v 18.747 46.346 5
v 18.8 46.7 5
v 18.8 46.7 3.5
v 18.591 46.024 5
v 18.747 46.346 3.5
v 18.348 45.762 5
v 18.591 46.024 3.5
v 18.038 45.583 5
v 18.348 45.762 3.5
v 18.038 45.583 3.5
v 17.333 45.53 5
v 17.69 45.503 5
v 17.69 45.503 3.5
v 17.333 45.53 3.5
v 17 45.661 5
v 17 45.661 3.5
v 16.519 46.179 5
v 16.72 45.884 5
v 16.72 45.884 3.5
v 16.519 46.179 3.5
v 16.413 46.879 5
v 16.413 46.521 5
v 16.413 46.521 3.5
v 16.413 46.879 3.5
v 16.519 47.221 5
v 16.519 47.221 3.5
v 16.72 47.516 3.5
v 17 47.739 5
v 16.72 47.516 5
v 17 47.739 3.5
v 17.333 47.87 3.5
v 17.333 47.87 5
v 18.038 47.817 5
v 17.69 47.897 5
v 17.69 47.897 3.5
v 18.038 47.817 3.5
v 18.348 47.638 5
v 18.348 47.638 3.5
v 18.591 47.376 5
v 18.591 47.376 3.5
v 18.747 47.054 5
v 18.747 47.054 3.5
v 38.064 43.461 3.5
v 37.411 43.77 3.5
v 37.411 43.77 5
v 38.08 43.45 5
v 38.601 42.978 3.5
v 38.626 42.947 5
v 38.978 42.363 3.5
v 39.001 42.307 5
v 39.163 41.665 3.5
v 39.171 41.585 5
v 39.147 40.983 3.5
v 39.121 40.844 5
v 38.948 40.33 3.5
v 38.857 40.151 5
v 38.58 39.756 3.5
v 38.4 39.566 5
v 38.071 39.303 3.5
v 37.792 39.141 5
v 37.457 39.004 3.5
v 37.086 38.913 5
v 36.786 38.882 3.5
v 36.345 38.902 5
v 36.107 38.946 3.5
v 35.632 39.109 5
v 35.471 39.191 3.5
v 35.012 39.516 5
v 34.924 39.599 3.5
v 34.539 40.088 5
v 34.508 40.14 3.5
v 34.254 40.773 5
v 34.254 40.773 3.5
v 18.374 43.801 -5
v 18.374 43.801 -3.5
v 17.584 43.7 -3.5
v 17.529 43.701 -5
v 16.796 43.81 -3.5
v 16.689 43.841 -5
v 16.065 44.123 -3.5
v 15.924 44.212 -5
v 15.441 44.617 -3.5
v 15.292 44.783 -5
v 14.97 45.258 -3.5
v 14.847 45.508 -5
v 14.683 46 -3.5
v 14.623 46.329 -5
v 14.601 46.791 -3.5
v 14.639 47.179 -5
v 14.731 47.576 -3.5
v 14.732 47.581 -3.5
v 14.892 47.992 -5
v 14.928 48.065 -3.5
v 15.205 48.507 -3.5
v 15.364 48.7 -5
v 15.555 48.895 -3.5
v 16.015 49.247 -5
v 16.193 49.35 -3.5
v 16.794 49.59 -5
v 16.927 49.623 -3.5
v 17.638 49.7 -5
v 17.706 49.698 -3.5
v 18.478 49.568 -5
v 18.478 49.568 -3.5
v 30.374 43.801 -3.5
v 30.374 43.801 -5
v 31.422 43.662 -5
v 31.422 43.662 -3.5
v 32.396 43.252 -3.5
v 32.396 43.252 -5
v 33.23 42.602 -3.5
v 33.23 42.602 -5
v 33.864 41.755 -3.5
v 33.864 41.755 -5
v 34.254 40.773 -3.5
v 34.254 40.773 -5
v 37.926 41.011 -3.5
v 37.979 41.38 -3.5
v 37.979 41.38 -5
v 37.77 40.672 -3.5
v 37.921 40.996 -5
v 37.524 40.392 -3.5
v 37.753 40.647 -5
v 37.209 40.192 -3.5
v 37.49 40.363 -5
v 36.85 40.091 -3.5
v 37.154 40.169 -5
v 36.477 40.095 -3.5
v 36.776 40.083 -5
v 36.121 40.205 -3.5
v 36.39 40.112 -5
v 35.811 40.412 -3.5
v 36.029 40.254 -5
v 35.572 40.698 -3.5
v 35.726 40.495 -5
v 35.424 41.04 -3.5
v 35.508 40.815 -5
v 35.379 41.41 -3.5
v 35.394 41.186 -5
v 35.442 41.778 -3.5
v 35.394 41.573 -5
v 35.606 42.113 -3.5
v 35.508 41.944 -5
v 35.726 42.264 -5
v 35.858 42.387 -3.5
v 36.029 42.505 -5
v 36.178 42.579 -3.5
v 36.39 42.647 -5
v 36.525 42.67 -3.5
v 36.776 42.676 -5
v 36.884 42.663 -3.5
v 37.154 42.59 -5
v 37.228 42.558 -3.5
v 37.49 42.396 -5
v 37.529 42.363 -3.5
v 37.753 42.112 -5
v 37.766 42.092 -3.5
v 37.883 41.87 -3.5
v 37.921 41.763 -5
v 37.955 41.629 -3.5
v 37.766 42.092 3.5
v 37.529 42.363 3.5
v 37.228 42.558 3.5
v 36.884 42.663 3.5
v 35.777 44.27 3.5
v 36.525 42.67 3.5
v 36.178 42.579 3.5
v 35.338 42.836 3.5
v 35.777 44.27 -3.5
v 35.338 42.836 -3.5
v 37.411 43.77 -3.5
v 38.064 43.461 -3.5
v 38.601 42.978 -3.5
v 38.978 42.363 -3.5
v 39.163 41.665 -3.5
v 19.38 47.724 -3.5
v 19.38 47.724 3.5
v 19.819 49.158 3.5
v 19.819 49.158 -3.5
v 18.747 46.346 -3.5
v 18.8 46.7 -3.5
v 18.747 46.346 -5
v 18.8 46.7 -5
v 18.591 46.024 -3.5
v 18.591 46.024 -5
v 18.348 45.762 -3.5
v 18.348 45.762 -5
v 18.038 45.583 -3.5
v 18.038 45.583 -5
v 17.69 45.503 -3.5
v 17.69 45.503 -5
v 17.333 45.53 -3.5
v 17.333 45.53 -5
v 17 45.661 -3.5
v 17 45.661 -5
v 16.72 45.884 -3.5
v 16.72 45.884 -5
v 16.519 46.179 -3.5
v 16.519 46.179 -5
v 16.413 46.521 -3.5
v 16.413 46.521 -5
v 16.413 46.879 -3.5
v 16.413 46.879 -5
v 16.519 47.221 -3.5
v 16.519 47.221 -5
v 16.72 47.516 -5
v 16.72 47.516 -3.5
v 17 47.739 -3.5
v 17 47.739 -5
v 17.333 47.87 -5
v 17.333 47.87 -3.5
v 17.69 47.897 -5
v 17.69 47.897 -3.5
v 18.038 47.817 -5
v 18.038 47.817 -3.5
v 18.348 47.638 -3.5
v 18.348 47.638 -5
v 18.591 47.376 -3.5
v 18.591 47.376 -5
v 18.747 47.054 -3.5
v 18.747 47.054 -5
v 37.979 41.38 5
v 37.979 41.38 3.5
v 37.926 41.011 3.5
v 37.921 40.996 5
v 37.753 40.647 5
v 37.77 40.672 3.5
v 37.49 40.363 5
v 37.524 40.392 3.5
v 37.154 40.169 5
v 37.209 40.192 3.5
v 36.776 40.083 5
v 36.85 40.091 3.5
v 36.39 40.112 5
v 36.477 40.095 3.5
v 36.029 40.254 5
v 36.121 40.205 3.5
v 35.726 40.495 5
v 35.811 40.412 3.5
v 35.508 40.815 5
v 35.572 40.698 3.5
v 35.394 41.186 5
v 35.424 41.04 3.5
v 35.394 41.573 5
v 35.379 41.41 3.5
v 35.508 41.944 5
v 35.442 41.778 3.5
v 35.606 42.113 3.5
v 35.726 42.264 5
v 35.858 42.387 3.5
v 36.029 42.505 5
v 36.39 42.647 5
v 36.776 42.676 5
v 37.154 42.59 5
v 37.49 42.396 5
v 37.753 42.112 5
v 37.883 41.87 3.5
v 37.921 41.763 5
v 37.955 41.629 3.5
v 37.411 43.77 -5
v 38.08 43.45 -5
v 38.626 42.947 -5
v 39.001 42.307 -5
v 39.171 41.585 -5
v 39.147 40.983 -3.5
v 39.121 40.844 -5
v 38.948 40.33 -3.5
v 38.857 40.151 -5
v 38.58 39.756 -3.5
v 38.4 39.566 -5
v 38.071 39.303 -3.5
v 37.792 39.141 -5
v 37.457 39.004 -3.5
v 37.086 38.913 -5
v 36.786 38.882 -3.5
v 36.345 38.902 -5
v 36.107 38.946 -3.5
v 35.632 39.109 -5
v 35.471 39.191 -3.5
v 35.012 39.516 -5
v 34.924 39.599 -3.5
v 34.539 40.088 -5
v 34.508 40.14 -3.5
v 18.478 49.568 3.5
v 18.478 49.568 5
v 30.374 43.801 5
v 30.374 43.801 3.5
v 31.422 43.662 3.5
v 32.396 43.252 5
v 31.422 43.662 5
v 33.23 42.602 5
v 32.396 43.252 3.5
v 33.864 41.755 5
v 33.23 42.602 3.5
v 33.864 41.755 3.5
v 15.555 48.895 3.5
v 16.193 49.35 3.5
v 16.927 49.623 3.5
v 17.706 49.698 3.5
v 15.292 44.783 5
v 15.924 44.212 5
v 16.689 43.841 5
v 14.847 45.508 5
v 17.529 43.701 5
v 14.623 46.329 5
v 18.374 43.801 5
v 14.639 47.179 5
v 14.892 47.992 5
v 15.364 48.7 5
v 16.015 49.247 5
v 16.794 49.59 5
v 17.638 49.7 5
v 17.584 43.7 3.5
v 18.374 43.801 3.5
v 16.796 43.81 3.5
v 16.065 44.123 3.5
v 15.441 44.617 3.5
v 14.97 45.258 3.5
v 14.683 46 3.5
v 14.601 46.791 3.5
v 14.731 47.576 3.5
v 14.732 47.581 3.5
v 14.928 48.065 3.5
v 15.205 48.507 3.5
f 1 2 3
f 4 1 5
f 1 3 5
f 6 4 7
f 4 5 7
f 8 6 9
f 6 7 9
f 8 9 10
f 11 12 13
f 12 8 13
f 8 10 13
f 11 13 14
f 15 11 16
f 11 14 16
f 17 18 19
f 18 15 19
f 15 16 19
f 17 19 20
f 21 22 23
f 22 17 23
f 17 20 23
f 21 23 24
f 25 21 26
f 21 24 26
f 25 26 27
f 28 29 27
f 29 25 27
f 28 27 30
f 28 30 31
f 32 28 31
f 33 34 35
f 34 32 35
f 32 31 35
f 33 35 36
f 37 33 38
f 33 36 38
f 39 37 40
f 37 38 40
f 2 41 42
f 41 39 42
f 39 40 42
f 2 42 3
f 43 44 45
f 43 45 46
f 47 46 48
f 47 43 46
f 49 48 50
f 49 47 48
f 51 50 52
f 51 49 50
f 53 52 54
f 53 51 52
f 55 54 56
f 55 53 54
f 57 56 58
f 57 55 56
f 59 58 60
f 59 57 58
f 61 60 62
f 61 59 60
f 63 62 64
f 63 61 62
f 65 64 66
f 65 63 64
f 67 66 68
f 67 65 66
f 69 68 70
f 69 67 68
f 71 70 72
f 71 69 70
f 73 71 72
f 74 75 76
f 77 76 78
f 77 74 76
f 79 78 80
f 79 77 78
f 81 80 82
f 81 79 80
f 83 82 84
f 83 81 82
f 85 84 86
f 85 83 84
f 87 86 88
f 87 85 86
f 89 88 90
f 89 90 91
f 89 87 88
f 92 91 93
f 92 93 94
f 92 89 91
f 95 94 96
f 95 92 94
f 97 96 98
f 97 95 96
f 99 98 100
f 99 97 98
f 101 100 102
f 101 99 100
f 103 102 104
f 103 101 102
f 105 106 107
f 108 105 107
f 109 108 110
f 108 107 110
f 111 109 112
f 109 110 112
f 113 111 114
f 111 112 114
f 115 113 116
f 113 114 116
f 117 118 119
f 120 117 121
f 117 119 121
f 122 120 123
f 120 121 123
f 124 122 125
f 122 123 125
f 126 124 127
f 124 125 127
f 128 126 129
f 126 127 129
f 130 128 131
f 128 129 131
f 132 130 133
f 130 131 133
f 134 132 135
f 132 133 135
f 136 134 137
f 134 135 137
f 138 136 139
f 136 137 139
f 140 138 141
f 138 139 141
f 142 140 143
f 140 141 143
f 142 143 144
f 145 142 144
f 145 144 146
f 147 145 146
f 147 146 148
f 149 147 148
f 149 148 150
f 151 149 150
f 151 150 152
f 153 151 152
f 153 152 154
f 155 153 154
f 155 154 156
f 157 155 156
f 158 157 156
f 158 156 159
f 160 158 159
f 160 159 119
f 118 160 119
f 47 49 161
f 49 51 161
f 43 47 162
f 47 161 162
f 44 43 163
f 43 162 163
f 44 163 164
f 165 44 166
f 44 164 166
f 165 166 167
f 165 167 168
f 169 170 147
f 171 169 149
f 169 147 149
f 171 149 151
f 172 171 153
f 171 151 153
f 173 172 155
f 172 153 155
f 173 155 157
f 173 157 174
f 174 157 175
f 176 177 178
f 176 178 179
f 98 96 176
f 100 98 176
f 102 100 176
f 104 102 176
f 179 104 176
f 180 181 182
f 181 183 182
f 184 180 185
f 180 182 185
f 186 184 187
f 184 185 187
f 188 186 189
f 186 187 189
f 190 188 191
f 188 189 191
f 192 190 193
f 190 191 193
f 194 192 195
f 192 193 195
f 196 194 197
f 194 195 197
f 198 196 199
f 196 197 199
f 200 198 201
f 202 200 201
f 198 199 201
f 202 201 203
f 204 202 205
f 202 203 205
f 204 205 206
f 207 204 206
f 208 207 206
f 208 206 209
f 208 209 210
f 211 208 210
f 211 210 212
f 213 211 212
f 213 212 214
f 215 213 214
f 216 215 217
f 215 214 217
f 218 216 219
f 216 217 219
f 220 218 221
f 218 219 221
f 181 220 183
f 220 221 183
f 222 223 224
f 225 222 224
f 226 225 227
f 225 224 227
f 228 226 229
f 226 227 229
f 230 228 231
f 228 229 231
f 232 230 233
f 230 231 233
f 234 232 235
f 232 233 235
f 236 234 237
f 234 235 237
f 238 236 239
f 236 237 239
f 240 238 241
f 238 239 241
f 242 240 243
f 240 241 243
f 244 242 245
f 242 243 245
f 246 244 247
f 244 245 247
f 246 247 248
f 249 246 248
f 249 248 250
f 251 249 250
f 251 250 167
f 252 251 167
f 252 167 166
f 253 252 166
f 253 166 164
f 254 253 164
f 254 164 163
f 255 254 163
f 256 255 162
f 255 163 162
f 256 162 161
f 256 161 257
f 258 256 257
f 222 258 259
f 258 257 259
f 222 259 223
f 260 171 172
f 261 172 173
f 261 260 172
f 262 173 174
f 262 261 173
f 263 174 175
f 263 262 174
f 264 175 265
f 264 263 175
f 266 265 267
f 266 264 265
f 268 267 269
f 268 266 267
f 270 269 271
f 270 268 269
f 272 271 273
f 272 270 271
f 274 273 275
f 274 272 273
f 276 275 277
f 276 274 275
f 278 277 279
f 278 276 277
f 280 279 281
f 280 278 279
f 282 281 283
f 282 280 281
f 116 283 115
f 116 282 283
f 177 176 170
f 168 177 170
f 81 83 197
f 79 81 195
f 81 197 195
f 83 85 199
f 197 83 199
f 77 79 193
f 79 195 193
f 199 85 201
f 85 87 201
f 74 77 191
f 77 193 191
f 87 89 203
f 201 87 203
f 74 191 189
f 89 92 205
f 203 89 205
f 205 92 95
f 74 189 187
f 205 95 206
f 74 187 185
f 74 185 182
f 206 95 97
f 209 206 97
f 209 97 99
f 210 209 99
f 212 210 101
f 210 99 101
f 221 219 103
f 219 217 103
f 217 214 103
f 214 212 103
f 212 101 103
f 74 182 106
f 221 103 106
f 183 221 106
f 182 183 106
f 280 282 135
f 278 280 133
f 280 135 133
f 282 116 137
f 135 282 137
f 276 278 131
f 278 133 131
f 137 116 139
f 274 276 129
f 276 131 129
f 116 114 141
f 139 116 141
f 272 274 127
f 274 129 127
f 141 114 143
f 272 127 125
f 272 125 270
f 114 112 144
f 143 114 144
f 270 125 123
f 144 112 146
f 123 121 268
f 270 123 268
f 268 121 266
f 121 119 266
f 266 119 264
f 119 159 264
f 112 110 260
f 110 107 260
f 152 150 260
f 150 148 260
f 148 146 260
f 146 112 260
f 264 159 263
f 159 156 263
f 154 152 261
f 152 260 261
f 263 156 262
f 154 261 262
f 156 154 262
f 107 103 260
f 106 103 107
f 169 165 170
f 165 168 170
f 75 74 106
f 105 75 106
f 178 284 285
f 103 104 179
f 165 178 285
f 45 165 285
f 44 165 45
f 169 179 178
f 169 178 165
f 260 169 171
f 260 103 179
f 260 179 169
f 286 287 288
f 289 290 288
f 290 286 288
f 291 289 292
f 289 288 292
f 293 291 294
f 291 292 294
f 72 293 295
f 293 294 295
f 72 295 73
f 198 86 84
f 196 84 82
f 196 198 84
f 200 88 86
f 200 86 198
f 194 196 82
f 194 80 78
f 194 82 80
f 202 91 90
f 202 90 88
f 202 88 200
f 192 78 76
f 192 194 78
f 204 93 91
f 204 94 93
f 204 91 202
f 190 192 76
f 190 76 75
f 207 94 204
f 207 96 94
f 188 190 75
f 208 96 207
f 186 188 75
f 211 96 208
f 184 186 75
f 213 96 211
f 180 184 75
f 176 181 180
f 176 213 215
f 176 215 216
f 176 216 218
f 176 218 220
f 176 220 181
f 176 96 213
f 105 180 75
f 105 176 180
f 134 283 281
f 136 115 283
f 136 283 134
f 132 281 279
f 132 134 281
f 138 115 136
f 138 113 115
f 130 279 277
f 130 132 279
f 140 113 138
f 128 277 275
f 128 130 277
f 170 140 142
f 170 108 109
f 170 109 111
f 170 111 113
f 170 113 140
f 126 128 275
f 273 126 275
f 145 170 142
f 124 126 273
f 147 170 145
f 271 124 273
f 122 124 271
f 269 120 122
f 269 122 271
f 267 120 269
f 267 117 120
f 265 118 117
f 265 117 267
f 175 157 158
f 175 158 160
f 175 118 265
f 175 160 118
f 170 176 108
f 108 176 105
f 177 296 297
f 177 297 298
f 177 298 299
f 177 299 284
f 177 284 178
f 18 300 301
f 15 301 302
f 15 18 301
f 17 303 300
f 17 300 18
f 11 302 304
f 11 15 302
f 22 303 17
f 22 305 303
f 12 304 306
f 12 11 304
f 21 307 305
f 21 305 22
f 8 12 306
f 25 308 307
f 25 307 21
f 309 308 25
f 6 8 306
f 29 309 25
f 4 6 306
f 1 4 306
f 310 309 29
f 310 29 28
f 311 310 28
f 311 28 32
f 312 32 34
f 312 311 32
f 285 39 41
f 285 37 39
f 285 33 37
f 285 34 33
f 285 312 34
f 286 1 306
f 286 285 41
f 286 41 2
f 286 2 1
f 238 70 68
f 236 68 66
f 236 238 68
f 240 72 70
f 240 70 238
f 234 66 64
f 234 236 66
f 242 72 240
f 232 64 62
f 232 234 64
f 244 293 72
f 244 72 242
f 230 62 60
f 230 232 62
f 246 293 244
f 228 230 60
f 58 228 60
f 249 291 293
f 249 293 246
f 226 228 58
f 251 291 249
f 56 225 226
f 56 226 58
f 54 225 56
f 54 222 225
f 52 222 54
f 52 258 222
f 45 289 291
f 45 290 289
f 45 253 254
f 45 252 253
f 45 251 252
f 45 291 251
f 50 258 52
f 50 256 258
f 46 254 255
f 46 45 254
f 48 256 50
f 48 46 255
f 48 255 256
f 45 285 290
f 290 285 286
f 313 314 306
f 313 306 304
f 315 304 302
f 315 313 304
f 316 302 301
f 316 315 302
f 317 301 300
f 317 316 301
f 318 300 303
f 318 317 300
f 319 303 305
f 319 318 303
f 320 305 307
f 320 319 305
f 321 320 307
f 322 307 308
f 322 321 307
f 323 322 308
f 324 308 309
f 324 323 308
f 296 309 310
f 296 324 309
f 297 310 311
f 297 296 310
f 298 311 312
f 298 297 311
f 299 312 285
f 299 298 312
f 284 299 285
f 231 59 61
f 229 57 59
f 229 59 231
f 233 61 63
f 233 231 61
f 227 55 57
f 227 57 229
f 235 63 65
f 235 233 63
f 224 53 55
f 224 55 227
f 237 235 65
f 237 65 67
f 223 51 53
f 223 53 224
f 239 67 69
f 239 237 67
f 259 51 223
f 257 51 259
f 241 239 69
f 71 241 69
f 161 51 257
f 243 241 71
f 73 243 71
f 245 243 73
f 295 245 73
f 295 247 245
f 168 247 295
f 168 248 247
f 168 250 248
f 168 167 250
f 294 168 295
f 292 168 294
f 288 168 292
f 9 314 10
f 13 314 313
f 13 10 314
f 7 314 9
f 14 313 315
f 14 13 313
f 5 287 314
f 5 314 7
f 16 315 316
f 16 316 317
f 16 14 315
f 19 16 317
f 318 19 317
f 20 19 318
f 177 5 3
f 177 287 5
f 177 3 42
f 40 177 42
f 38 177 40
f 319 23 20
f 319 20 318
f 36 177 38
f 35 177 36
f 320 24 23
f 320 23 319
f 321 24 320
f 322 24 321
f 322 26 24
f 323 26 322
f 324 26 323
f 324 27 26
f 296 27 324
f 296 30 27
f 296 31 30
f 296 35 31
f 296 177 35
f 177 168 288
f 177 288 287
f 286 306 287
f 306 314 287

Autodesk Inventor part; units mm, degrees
ref_plane "YZ Plane" through (0, 0, 0) normal (1, 0, 0) x (0, 1, 0)
ref_plane "XZ Plane" through (0, 0, 0) normal (0, 1, 0) x (-1, 0, 0)
sketch "Sketch1" plane through (0, 0, 0) normal (0, 0, 1) x (1, 0, 0)
  circle A0 centre (17.6, 46.7) radius 1.2
  circle A1 centre (36.679, 41.3795) radius 1.3
  arc A2 (18.4785, 49.5685) -> (18.3735, 43.8014) centre (17.6, 46.7) ccw
  arc A3 (34.2538, 40.7726) -> (37.4111, 43.7699) centre (36.679, 41.3795) ccw
  line L0 (18.4785, 49.5685) -> (37.4111, 43.7699)
  line L1 (18.3735, 43.8014) -> (30.3735, 43.8014)
  arc A4 (34.2538, 40.7726) -> (30.3735, 43.8014) centre (30.3735, 39.8014) ccw
  circle A5 centre (36.679, 41.3795) radius 1.2
  point P0 (0, 0)
  dimension "d0" = 5
  dimension "d1" = 3
  dimension "d3" = 4
  dimension "d14" = 12
  dimension "d15" = 2.6
extrude "Extrusion1" add sketch "Sketch1" along normal mid plane 10 contours L0 A3 A4 L1 A2
ref_plane "Work Plane1" through (36.9719, 42.3357, 5) normal (0.2928471, 0.9561593, 0) x (0.9561593, -0.2928471, 0)
sketch "Sketch2" plane through (36.9719, 42.3357, 5) normal (0.2928471, 0.9561593, 0) x (0.9561593, -0.2928471, 0)
  line L0 (8.6668, 5) -> (-28.9168, 5) projected
  line L1 (-22.8007, 8.5) -> (2.5, 8.5)
  line L2 (2.5, 8.5) -> (2.5, 1.5)
  line L3 (2.5, 1.5) -> (-22.8007, 1.5)
  line L4 (-22.8007, 1.5) -> (-22.8007, 8.5)
  line L5 (2.5, 10) -> (2.5, 0) projected
  line L6 (-22.8007, 10) -> (-22.8007, 0) projected
  point P0 (-22.9531, 5)
  dimension "d7" = 7
extrude "Extrusion2" cut sketch "Sketch2" against normal through all
sketch "Sketch3" plane through (36.9719, 42.3357, 5) normal (-0.2928471, -0.9561593, 0) x (0.9561593, -0.2928471, 0)
  line L0 (-22.3987, -8.5) -> (-22.3987, -1.5) projected
  line L1 (-22.3987, -8.5) -> (2.2913, -8.5) projected
  line L2 (2.2913, -1.5) -> (2.2913, -8.5) projected
  line L3 (-22.3987, -1.5) -> (-18.3987, -1.5)
  line L4 (-18.3987, -1.5) -> (-18.3987, -8.5)
  line L5 (-18.3987, -8.5) -> (-22.3987, -8.5)
  line L6 (-22.3987, -8.5) -> (-22.3987, -1.5)
  line L7 (2.2913, -1.5) -> (-1.7087, -1.5)
  line L8 (-1.7087, -1.5) -> (-1.7087, -8.5)
  line L9 (-1.7087, -8.5) -> (2.2913, -8.5)
  line L10 (2.2913, -8.5) -> (2.2913, -1.5)
  point P0 (-22.9531, -5)
  dimension "d10" = 4
  dimension "d11" = 4
extrude "Extrusion3" cut sketch "Sketch3" against normal through all
properties part number "Lever for overlay hinge" material "Steel"
